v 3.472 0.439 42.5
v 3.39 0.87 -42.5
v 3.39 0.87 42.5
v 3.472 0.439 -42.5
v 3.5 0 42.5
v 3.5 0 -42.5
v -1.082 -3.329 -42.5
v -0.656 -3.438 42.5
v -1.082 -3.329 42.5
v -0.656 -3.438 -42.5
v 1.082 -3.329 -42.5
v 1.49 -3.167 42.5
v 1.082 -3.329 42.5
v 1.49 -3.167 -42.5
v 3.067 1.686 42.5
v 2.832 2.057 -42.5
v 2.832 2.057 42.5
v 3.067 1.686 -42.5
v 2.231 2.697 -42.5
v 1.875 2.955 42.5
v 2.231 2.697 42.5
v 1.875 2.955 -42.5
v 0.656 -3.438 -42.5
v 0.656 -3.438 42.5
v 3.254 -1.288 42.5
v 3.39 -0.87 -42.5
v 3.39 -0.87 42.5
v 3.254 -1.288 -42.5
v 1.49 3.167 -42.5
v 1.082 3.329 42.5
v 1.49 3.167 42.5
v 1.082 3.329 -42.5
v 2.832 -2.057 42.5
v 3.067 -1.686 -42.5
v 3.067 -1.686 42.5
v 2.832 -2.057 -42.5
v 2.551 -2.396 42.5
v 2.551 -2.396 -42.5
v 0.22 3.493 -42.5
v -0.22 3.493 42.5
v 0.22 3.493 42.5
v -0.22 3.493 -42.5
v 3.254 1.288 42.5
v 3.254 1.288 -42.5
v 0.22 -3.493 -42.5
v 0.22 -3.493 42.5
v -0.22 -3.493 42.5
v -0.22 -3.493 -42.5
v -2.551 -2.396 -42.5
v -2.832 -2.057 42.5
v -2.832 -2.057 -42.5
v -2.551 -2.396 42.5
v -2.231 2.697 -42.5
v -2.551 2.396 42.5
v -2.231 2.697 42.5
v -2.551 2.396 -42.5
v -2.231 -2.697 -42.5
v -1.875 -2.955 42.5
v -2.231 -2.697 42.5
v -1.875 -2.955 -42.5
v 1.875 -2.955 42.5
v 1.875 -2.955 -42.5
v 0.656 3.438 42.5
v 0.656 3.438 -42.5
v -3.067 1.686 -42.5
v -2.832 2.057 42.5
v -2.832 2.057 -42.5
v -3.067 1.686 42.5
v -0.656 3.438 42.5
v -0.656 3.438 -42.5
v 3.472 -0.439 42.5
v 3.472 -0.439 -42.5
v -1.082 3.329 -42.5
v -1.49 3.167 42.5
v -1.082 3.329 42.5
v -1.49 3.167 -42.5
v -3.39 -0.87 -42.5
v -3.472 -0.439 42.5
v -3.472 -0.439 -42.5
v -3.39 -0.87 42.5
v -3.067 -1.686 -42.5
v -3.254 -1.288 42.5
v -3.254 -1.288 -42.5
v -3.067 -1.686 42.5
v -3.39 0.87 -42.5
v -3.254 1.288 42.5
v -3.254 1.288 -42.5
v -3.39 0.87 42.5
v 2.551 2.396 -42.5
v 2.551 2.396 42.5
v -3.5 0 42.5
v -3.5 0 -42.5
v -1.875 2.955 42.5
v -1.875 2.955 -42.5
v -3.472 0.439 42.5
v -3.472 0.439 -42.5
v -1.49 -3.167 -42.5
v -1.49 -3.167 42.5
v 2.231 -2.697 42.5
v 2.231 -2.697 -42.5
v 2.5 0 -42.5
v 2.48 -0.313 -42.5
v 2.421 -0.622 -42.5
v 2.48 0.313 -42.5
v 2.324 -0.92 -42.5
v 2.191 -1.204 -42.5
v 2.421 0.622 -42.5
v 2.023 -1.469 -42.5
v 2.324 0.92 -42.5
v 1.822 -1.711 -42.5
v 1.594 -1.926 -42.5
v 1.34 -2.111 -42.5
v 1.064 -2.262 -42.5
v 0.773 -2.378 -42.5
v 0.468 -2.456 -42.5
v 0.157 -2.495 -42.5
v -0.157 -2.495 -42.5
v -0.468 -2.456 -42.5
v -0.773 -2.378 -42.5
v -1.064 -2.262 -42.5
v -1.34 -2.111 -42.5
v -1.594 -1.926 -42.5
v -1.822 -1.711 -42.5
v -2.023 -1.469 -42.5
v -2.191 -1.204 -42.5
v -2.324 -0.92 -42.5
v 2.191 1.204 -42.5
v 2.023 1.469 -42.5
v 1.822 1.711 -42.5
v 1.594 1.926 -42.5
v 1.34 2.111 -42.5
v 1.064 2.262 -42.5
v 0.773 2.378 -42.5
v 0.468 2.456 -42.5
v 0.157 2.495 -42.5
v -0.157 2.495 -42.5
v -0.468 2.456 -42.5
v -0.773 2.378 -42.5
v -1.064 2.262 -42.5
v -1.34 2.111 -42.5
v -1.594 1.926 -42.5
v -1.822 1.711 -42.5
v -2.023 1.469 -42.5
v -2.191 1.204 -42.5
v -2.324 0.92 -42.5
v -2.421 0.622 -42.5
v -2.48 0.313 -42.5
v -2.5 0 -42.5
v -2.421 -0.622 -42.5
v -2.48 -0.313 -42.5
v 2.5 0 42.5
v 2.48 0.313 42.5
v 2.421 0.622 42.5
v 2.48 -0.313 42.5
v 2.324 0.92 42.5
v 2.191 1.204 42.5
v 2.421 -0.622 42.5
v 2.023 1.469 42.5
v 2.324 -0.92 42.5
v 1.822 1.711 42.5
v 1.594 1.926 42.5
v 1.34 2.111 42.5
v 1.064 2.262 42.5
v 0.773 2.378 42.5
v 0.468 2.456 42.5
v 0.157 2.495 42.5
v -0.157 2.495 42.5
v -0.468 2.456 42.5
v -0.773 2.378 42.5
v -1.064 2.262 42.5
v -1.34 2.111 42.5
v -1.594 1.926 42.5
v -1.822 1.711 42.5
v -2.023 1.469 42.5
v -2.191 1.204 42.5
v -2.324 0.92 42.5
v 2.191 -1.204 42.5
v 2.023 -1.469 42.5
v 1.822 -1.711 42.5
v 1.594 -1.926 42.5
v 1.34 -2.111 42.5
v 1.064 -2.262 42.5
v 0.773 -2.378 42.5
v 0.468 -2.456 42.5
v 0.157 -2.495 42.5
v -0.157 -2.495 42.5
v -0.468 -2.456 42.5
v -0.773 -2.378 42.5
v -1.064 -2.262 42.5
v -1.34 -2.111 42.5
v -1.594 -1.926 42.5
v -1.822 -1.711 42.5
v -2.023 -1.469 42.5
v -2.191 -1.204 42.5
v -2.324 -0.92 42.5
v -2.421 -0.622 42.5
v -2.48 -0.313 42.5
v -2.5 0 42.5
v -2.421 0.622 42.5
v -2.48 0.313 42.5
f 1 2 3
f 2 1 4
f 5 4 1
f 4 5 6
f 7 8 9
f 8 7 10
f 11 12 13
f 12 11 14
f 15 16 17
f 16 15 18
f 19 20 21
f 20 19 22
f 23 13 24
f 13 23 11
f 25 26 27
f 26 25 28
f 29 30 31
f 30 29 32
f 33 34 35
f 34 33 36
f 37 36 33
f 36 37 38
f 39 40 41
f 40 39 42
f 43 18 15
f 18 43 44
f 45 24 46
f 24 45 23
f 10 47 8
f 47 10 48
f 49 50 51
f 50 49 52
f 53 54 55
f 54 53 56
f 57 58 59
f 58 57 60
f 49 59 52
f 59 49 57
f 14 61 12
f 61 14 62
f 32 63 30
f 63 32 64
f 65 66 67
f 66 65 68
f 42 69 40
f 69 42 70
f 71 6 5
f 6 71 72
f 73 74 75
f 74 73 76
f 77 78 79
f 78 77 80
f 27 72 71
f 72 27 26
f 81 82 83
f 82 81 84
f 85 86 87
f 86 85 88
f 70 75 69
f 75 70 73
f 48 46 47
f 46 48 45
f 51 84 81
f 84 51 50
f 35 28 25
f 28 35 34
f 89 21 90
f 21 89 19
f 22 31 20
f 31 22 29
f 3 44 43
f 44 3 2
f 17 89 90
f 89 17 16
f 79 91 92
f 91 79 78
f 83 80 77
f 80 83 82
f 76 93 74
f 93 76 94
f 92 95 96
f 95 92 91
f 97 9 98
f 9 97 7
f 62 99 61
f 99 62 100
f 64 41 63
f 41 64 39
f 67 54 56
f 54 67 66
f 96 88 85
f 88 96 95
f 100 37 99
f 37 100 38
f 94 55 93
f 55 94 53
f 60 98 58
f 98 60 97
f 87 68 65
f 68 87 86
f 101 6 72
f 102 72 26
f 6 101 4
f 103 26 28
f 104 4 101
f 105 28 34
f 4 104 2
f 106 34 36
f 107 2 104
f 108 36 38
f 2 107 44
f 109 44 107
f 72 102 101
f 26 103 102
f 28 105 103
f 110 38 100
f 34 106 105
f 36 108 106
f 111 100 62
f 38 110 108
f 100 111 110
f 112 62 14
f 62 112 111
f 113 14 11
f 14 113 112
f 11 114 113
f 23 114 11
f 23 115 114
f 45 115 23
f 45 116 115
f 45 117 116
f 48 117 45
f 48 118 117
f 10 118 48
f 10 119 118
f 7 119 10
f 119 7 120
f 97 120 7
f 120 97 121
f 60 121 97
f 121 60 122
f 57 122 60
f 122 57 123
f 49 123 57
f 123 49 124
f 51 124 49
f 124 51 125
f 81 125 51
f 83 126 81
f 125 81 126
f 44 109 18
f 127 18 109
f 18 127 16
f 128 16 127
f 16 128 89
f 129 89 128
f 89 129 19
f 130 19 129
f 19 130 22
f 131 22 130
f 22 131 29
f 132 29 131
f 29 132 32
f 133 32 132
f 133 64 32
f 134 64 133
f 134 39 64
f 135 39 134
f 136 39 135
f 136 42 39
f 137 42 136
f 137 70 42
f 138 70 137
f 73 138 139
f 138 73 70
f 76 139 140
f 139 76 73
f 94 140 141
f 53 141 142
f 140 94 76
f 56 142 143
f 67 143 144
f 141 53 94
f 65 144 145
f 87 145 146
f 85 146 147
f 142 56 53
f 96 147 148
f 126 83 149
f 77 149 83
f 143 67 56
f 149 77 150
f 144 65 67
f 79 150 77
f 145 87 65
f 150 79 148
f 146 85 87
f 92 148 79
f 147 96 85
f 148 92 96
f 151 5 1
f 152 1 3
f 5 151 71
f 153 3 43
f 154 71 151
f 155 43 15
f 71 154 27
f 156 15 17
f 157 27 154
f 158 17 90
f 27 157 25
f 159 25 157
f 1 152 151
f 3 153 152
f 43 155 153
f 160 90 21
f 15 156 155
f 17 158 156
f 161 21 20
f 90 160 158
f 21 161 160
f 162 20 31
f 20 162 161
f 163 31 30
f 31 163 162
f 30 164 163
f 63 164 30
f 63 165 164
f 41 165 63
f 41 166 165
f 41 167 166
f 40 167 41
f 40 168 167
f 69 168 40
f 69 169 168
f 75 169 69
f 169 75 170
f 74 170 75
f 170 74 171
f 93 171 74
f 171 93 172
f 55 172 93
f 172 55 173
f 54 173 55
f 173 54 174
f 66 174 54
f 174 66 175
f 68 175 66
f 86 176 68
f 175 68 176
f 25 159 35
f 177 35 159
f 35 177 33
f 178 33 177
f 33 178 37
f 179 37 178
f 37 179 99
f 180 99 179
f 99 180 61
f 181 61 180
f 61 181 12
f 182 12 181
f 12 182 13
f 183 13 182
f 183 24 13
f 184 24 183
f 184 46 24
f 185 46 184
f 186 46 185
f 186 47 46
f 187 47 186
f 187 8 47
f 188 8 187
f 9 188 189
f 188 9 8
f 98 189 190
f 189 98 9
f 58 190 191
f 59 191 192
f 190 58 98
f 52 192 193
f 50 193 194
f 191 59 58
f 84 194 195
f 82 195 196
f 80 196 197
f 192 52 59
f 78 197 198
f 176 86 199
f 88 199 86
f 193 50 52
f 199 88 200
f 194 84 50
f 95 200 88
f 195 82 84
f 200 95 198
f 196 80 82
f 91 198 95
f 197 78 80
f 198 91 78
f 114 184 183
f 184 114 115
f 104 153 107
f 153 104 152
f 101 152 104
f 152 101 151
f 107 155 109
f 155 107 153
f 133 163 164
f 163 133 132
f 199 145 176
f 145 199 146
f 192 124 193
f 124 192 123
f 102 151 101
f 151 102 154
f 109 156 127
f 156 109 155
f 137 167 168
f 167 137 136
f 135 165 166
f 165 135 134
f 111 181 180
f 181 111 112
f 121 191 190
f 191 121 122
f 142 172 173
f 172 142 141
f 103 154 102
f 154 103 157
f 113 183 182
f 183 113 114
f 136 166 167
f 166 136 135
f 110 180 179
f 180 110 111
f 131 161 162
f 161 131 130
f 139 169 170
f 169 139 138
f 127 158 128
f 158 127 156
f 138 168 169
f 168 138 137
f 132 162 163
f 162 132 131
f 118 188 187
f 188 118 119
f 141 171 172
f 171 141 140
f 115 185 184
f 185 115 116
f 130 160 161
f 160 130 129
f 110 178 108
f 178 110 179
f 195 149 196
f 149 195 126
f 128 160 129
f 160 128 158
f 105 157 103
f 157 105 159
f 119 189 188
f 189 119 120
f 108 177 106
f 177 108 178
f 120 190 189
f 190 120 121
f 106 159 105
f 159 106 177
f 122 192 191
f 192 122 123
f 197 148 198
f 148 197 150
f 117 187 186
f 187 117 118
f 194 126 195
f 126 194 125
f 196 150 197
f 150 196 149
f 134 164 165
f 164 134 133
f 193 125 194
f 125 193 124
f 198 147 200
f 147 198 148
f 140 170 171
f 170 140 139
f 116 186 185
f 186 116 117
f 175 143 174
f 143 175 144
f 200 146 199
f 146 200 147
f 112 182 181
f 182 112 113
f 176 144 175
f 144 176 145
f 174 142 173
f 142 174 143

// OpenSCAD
$fn = 50;


difference() {
	union() {
		translate(v = [0, 0, -42.5000000000]) {
			cylinder(h = 85, r = 3.5000000000);
		}
	}
	union() {
		translate(v = [0, 0, -100.0000000000]) {
			cylinder(h = 200, r = 2.5000000000);
		}
	}
}
